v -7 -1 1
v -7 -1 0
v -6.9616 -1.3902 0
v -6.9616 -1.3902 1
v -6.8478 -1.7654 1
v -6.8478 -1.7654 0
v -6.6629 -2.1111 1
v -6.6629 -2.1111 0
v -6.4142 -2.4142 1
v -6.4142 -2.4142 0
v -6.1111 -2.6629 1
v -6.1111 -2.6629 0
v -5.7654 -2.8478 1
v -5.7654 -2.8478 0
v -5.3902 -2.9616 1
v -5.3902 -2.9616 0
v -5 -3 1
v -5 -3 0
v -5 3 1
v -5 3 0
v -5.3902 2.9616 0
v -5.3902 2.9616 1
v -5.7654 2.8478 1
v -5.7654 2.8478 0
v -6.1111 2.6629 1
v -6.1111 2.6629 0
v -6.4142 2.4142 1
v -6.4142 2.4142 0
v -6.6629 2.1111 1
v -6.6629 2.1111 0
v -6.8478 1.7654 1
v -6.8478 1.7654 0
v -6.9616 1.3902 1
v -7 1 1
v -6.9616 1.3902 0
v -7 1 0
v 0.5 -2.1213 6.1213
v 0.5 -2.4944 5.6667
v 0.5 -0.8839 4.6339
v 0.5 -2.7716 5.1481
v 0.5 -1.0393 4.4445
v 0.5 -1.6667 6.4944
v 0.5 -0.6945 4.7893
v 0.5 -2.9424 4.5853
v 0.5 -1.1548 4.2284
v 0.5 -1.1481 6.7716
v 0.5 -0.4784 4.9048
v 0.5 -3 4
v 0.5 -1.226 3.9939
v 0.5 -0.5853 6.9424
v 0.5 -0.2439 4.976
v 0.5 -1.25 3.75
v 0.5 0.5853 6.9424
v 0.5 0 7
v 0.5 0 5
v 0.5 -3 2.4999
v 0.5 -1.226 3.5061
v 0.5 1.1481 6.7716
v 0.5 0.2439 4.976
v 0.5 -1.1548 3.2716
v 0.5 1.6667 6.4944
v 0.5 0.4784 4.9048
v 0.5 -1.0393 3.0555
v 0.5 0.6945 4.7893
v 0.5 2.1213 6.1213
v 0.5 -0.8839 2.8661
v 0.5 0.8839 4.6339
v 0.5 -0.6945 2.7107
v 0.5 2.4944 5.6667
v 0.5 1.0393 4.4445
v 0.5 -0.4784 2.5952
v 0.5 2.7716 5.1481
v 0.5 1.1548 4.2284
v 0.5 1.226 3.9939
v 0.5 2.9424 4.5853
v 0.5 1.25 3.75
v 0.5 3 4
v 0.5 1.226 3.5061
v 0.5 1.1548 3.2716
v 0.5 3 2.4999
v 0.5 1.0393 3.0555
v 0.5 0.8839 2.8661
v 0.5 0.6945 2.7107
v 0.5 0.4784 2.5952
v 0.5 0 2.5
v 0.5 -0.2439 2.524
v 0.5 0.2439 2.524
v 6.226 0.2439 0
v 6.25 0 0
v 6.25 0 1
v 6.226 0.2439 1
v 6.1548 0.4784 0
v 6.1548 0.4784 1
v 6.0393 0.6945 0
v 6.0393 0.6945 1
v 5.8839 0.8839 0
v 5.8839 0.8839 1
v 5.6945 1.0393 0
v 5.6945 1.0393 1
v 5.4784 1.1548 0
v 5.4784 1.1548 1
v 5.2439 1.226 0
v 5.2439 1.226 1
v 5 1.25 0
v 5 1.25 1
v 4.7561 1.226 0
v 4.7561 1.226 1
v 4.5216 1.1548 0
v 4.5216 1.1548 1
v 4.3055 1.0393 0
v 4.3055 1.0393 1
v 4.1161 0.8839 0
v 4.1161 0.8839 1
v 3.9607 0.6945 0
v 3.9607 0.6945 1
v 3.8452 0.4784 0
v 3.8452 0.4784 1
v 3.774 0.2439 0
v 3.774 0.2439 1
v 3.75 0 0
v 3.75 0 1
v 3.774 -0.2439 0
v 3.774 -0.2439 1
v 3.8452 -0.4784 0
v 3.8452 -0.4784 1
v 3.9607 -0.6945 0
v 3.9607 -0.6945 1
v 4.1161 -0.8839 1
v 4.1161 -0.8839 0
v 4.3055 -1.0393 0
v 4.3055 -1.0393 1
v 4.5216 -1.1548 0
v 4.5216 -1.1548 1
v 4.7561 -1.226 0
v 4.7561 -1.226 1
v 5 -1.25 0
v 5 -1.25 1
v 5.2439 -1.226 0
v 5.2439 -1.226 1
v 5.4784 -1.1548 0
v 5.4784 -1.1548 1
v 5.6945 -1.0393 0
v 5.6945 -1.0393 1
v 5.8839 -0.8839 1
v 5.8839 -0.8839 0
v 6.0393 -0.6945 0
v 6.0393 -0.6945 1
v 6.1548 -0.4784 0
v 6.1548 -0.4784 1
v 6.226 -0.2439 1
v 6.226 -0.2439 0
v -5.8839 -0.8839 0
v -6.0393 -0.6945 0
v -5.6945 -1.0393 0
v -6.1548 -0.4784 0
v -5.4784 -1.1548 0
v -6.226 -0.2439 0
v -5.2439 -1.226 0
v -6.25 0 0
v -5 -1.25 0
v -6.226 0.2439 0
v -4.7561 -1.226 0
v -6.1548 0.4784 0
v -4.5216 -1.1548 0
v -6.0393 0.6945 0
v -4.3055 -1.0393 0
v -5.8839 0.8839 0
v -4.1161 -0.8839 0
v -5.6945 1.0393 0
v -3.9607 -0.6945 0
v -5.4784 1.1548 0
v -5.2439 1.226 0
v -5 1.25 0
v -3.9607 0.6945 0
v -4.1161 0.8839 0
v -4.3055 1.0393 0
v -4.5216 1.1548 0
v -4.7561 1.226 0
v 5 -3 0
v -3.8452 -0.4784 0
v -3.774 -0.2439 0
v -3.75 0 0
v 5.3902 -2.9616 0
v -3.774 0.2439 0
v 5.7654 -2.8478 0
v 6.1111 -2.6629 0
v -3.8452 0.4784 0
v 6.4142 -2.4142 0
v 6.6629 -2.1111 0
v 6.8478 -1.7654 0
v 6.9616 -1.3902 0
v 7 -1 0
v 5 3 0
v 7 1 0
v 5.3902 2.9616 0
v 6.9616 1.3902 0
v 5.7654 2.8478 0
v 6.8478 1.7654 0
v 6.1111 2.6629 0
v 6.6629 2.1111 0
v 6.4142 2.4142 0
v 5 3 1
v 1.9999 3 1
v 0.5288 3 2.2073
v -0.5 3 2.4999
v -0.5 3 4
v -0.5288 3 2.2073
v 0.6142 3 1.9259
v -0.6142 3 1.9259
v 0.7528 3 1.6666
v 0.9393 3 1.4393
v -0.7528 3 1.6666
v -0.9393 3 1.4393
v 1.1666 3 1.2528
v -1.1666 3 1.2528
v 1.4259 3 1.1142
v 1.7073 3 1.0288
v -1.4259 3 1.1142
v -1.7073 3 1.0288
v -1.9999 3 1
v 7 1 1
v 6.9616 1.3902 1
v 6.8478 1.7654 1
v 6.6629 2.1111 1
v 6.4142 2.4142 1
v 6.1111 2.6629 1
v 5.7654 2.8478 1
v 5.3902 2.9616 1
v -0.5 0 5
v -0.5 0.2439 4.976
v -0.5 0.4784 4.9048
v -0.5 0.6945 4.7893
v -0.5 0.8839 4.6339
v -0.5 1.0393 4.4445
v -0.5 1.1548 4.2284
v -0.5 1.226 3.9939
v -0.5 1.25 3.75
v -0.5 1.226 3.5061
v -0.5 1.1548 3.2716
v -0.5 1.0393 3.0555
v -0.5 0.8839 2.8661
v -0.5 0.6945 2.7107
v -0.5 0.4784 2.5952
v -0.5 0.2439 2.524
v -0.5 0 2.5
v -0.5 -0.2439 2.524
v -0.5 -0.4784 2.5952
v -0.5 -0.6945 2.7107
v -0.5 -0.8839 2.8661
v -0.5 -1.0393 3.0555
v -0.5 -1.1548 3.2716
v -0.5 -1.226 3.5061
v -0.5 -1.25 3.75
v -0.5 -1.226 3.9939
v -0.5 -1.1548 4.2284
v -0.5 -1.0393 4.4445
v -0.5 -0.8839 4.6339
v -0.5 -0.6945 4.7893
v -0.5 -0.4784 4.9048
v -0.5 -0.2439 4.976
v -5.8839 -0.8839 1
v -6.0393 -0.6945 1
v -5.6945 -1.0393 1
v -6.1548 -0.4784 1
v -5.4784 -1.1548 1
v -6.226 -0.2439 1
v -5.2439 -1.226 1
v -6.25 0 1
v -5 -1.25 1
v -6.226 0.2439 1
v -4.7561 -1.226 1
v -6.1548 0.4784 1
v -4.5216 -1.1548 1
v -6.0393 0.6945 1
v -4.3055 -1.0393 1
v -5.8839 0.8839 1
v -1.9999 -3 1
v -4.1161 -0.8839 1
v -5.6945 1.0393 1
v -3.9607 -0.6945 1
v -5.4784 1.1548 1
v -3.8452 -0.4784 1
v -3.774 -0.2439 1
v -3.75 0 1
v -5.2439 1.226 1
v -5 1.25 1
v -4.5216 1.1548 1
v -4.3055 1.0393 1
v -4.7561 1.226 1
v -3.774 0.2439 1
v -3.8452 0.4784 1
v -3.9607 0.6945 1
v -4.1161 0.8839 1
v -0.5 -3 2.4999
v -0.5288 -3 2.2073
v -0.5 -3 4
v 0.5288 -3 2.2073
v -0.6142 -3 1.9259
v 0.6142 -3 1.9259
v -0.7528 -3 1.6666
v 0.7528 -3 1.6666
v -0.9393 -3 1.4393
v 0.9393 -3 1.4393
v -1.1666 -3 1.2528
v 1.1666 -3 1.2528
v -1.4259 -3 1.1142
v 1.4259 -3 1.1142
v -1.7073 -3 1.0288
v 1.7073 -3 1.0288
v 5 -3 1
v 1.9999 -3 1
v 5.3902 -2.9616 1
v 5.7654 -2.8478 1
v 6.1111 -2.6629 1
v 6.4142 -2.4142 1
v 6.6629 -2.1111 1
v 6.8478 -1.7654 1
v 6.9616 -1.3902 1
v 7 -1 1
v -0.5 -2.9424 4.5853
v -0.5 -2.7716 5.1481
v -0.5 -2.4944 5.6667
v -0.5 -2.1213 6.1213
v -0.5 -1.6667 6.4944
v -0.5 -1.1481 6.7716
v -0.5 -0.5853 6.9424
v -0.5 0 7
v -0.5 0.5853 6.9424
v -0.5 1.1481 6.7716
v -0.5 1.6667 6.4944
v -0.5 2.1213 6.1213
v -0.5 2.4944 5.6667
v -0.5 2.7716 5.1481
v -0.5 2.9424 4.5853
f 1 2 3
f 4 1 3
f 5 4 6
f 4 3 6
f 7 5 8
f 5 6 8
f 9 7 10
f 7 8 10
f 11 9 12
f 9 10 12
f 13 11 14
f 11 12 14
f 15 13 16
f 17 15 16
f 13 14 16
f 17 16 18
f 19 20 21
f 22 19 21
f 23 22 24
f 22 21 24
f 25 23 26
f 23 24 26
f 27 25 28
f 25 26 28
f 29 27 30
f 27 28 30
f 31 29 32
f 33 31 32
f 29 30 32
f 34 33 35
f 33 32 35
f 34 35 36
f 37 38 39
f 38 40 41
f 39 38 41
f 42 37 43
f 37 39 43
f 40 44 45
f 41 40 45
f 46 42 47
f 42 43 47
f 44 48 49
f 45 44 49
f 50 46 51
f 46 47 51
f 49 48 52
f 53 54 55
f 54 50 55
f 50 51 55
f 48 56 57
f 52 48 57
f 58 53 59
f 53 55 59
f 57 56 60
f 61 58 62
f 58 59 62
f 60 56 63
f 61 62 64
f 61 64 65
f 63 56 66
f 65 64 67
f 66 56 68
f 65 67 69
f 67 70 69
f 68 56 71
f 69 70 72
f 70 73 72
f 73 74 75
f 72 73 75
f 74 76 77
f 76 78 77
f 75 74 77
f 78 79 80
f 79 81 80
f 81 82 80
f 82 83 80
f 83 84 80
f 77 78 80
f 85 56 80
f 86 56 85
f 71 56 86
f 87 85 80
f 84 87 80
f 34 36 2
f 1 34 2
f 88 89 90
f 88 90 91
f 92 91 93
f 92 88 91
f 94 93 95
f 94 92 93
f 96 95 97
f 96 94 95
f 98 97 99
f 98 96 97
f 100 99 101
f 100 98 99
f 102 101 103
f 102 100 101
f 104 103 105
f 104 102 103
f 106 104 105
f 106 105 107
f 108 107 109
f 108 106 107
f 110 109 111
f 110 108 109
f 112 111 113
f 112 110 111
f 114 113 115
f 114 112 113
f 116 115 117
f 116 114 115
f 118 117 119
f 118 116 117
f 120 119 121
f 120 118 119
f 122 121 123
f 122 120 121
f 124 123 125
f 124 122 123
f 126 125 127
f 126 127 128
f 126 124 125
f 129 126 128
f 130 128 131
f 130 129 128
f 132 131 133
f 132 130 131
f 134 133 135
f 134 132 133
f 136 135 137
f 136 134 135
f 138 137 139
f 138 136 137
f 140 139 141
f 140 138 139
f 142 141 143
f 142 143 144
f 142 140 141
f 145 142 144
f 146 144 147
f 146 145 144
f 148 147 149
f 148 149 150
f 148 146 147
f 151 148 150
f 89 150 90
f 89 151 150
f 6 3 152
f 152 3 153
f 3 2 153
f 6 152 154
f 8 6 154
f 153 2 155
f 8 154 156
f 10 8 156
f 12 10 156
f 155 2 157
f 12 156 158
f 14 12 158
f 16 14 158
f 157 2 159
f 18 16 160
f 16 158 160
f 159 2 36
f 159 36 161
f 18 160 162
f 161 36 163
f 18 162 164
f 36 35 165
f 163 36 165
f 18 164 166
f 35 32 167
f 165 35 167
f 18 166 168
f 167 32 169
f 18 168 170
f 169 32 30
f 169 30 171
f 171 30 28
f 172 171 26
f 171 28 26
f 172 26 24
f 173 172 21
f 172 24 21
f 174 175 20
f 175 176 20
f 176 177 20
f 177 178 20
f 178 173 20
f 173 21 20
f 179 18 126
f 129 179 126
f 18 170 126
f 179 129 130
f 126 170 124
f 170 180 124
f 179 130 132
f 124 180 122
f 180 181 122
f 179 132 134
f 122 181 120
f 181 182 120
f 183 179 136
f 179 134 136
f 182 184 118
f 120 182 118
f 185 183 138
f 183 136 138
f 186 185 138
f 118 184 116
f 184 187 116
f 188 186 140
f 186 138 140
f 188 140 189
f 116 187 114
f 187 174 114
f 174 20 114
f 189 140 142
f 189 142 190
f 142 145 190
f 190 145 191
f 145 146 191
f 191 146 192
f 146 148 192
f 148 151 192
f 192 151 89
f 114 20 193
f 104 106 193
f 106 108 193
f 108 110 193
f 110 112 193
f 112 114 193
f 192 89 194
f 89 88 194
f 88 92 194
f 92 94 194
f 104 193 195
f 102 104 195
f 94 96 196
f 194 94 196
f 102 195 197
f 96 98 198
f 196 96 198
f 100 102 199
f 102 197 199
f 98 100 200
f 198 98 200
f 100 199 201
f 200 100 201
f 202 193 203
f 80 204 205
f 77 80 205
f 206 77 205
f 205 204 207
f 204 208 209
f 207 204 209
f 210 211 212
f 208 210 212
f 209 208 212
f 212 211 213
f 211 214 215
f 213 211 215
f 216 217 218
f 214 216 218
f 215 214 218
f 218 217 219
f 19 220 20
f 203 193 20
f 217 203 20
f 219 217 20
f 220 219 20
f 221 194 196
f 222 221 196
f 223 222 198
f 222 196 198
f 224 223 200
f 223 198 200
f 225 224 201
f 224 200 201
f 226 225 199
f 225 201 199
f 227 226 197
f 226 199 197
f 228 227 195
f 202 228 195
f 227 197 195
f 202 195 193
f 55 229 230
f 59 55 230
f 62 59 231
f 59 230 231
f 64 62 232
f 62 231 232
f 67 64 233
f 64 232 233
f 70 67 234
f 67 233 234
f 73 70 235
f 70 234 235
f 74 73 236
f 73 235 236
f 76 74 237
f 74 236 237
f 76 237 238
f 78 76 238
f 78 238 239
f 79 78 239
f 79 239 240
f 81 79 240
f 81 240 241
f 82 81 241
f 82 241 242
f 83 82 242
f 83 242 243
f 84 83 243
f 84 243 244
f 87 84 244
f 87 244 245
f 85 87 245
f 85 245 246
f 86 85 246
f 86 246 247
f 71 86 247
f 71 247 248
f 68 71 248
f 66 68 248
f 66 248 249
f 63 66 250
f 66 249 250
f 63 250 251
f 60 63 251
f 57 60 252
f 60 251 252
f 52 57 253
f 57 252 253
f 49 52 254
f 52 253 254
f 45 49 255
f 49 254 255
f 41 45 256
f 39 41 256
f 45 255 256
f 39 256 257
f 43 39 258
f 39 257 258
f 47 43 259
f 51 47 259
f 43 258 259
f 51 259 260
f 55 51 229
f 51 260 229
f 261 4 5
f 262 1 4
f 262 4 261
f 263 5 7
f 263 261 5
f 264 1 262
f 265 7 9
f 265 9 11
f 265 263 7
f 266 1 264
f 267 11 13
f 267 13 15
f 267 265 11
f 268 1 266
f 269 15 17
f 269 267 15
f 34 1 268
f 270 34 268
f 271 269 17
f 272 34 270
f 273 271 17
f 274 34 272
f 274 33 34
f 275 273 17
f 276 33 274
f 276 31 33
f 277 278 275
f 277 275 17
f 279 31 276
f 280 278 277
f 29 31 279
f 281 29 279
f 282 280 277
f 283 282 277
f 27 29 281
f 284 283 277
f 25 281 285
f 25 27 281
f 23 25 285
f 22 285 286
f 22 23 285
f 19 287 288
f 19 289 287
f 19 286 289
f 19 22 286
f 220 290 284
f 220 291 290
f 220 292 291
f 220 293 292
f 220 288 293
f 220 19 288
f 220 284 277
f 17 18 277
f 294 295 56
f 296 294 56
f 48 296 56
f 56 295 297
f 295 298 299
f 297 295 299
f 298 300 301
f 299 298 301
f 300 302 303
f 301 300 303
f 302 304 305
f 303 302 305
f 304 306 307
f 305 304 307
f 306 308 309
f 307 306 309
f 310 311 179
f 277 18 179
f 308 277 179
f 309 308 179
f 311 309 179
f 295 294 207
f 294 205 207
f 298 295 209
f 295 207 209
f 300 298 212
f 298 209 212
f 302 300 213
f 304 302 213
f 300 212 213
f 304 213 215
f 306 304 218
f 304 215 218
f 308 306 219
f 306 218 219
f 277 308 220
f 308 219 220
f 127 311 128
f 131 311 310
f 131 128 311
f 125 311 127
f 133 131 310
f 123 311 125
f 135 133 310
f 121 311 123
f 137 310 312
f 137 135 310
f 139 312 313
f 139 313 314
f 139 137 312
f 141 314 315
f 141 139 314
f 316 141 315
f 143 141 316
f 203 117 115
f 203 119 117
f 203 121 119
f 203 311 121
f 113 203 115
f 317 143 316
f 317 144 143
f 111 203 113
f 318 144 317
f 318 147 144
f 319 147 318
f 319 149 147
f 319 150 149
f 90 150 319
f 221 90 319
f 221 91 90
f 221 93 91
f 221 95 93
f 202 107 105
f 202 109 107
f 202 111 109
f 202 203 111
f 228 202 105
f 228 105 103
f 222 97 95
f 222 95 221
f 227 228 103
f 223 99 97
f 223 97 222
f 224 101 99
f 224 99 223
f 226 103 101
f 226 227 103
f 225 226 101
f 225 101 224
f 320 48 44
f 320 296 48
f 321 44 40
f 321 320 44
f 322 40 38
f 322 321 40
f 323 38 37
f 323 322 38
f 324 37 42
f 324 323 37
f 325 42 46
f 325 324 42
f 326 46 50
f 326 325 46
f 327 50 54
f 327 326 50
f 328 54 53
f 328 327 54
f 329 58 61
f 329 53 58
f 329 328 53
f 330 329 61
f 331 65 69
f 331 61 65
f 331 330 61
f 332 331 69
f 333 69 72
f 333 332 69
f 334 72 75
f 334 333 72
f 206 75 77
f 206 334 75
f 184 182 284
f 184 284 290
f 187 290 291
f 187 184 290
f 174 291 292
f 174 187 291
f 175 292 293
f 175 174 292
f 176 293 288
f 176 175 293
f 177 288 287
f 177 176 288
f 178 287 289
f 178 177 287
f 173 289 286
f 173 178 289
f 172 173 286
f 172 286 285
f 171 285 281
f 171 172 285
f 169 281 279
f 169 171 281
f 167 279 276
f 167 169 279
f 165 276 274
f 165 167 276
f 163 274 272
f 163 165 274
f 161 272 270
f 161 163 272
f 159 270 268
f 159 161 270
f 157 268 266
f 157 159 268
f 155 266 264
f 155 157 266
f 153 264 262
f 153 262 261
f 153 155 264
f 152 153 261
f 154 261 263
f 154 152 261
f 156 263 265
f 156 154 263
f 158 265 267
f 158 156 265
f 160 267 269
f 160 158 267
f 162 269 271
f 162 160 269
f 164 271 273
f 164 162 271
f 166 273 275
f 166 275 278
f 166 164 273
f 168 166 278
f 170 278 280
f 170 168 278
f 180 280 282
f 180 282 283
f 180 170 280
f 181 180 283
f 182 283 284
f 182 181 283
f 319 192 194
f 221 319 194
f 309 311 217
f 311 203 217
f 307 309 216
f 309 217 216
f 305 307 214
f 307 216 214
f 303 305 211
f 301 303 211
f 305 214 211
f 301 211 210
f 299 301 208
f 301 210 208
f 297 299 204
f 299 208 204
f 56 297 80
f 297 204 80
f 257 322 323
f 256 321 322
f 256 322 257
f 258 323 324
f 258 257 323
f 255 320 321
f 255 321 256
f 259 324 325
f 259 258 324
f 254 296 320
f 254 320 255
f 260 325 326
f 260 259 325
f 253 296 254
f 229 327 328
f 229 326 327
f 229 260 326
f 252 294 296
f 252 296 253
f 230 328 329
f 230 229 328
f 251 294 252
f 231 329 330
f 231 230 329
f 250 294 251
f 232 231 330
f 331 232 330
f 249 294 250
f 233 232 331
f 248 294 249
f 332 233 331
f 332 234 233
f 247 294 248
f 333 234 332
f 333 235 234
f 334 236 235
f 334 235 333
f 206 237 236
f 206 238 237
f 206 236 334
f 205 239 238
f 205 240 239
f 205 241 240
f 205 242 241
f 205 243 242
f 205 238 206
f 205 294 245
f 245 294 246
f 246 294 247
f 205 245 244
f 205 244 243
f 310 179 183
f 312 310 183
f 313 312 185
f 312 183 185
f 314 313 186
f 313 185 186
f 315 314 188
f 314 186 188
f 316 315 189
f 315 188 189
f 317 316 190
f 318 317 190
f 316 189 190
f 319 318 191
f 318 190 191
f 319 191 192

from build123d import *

# Parameters (mm, degrees)
CROQUIS1_R              = 1.25
SALIENTE_EXTRUIR1_DEPTH = 1
CROQUIS2_W              = 1
CROQUIS2_H              = 6
SALIENTE_EXTRUIR2_DEPTH = 6
REDONDEO1_RADIUS        = 3
REDONDEO1_LENGTH        = 1
CORTAR_EXTRUIR1_REACH   = 12.689
CROQUIS3_R              = 1.25
REDONDEO2_R             = 1.5


with BuildPart() as part:
    # Croquis1 → Saliente-Extruir1 (new body)
    with BuildSketch(Plane.XY):
        with BuildLine():
            Line((-5, -3), (5, -3))
            ThreePointArc((5, -3), (6.414213562, -2.414213562), (7, -1))
            Line((7, -1), (7, 1))
            ThreePointArc((7, 1), (6.414213562, 2.414213562), (5, 3))
            Line((5, 3), (-5, 3))
            ThreePointArc((-5, 3), (-6.414213562, 2.414213562), (-7, 1))
            Line((-7, 1), (-7, -1))
            ThreePointArc((-7, -1), (-6.414213562, -2.414213562), (-5, -3))
        make_face()
        with Locations((-5, 0)):
            Circle(CROQUIS1_R, mode=Mode.SUBTRACT)
        with Locations((5, 0)):
            Circle(CROQUIS1_R, mode=Mode.SUBTRACT)
    extrude(amount=SALIENTE_EXTRUIR1_DEPTH)

    # Croquis2 → Saliente-Extruir2 (add)
    with BuildSketch(Plane.XY.offset(1)):
        Rectangle(CROQUIS2_W, CROQUIS2_H)
    extrude(amount=SALIENTE_EXTRUIR2_DEPTH)

    # Redondeo1: full round fillet: the end face becomes a half cylinder, R = half its width
    redondeo1_face = Plane((0, 0, 7), x_dir=(-1, 0, 0), z_dir=(0, 0, 1))  # on the end face: x along it, z out of the body
    redondeo1_slab = redondeo1_face.offset(-REDONDEO1_RADIUS / 2) * Box(REDONDEO1_LENGTH, 2 * REDONDEO1_RADIUS, REDONDEO1_RADIUS, mode=Mode.PRIVATE)  # the body's end, R deep
    redondeo1_round = Plane((0, 0, 4), x_dir=(0, 0, 1), z_dir=(-1, 0, 0)) * Cylinder(REDONDEO1_RADIUS, REDONDEO1_LENGTH, mode=Mode.PRIVATE)  # its axis R under the face
    add(redondeo1_slab - redondeo1_round, mode=Mode.SUBTRACT)

    # Croquis3 → Cortar-Extruir1 (cut, up to next)
    with BuildSketch(Plane.ZY.offset(0.5), mode=Mode.PRIVATE) as cortar_extruir1_sk1:
        with Locations((3.75, 0)):
            Circle(CROQUIS3_R)
    cortar_extruir1_tool1 = extrude(cortar_extruir1_sk1.sketch, amount=-CORTAR_EXTRUIR1_REACH, mode=Mode.PRIVATE) & part.part
    add(cortar_extruir1_tool1.solids().sort_by_distance((-0.5, 0, 3.75))[0], mode=Mode.SUBTRACT)

    # Redondeo2
    redondeo2_edges = [part.edges().sort_by_distance(p)[0] for p in [
        (0.5, 0, 1),
        (-0.5, 0, 1),
    ]]
    fillet(redondeo2_edges, radius=REDONDEO2_R - 0.0001)  # a hair under: the kernel refuses the full size


solid = part.part
